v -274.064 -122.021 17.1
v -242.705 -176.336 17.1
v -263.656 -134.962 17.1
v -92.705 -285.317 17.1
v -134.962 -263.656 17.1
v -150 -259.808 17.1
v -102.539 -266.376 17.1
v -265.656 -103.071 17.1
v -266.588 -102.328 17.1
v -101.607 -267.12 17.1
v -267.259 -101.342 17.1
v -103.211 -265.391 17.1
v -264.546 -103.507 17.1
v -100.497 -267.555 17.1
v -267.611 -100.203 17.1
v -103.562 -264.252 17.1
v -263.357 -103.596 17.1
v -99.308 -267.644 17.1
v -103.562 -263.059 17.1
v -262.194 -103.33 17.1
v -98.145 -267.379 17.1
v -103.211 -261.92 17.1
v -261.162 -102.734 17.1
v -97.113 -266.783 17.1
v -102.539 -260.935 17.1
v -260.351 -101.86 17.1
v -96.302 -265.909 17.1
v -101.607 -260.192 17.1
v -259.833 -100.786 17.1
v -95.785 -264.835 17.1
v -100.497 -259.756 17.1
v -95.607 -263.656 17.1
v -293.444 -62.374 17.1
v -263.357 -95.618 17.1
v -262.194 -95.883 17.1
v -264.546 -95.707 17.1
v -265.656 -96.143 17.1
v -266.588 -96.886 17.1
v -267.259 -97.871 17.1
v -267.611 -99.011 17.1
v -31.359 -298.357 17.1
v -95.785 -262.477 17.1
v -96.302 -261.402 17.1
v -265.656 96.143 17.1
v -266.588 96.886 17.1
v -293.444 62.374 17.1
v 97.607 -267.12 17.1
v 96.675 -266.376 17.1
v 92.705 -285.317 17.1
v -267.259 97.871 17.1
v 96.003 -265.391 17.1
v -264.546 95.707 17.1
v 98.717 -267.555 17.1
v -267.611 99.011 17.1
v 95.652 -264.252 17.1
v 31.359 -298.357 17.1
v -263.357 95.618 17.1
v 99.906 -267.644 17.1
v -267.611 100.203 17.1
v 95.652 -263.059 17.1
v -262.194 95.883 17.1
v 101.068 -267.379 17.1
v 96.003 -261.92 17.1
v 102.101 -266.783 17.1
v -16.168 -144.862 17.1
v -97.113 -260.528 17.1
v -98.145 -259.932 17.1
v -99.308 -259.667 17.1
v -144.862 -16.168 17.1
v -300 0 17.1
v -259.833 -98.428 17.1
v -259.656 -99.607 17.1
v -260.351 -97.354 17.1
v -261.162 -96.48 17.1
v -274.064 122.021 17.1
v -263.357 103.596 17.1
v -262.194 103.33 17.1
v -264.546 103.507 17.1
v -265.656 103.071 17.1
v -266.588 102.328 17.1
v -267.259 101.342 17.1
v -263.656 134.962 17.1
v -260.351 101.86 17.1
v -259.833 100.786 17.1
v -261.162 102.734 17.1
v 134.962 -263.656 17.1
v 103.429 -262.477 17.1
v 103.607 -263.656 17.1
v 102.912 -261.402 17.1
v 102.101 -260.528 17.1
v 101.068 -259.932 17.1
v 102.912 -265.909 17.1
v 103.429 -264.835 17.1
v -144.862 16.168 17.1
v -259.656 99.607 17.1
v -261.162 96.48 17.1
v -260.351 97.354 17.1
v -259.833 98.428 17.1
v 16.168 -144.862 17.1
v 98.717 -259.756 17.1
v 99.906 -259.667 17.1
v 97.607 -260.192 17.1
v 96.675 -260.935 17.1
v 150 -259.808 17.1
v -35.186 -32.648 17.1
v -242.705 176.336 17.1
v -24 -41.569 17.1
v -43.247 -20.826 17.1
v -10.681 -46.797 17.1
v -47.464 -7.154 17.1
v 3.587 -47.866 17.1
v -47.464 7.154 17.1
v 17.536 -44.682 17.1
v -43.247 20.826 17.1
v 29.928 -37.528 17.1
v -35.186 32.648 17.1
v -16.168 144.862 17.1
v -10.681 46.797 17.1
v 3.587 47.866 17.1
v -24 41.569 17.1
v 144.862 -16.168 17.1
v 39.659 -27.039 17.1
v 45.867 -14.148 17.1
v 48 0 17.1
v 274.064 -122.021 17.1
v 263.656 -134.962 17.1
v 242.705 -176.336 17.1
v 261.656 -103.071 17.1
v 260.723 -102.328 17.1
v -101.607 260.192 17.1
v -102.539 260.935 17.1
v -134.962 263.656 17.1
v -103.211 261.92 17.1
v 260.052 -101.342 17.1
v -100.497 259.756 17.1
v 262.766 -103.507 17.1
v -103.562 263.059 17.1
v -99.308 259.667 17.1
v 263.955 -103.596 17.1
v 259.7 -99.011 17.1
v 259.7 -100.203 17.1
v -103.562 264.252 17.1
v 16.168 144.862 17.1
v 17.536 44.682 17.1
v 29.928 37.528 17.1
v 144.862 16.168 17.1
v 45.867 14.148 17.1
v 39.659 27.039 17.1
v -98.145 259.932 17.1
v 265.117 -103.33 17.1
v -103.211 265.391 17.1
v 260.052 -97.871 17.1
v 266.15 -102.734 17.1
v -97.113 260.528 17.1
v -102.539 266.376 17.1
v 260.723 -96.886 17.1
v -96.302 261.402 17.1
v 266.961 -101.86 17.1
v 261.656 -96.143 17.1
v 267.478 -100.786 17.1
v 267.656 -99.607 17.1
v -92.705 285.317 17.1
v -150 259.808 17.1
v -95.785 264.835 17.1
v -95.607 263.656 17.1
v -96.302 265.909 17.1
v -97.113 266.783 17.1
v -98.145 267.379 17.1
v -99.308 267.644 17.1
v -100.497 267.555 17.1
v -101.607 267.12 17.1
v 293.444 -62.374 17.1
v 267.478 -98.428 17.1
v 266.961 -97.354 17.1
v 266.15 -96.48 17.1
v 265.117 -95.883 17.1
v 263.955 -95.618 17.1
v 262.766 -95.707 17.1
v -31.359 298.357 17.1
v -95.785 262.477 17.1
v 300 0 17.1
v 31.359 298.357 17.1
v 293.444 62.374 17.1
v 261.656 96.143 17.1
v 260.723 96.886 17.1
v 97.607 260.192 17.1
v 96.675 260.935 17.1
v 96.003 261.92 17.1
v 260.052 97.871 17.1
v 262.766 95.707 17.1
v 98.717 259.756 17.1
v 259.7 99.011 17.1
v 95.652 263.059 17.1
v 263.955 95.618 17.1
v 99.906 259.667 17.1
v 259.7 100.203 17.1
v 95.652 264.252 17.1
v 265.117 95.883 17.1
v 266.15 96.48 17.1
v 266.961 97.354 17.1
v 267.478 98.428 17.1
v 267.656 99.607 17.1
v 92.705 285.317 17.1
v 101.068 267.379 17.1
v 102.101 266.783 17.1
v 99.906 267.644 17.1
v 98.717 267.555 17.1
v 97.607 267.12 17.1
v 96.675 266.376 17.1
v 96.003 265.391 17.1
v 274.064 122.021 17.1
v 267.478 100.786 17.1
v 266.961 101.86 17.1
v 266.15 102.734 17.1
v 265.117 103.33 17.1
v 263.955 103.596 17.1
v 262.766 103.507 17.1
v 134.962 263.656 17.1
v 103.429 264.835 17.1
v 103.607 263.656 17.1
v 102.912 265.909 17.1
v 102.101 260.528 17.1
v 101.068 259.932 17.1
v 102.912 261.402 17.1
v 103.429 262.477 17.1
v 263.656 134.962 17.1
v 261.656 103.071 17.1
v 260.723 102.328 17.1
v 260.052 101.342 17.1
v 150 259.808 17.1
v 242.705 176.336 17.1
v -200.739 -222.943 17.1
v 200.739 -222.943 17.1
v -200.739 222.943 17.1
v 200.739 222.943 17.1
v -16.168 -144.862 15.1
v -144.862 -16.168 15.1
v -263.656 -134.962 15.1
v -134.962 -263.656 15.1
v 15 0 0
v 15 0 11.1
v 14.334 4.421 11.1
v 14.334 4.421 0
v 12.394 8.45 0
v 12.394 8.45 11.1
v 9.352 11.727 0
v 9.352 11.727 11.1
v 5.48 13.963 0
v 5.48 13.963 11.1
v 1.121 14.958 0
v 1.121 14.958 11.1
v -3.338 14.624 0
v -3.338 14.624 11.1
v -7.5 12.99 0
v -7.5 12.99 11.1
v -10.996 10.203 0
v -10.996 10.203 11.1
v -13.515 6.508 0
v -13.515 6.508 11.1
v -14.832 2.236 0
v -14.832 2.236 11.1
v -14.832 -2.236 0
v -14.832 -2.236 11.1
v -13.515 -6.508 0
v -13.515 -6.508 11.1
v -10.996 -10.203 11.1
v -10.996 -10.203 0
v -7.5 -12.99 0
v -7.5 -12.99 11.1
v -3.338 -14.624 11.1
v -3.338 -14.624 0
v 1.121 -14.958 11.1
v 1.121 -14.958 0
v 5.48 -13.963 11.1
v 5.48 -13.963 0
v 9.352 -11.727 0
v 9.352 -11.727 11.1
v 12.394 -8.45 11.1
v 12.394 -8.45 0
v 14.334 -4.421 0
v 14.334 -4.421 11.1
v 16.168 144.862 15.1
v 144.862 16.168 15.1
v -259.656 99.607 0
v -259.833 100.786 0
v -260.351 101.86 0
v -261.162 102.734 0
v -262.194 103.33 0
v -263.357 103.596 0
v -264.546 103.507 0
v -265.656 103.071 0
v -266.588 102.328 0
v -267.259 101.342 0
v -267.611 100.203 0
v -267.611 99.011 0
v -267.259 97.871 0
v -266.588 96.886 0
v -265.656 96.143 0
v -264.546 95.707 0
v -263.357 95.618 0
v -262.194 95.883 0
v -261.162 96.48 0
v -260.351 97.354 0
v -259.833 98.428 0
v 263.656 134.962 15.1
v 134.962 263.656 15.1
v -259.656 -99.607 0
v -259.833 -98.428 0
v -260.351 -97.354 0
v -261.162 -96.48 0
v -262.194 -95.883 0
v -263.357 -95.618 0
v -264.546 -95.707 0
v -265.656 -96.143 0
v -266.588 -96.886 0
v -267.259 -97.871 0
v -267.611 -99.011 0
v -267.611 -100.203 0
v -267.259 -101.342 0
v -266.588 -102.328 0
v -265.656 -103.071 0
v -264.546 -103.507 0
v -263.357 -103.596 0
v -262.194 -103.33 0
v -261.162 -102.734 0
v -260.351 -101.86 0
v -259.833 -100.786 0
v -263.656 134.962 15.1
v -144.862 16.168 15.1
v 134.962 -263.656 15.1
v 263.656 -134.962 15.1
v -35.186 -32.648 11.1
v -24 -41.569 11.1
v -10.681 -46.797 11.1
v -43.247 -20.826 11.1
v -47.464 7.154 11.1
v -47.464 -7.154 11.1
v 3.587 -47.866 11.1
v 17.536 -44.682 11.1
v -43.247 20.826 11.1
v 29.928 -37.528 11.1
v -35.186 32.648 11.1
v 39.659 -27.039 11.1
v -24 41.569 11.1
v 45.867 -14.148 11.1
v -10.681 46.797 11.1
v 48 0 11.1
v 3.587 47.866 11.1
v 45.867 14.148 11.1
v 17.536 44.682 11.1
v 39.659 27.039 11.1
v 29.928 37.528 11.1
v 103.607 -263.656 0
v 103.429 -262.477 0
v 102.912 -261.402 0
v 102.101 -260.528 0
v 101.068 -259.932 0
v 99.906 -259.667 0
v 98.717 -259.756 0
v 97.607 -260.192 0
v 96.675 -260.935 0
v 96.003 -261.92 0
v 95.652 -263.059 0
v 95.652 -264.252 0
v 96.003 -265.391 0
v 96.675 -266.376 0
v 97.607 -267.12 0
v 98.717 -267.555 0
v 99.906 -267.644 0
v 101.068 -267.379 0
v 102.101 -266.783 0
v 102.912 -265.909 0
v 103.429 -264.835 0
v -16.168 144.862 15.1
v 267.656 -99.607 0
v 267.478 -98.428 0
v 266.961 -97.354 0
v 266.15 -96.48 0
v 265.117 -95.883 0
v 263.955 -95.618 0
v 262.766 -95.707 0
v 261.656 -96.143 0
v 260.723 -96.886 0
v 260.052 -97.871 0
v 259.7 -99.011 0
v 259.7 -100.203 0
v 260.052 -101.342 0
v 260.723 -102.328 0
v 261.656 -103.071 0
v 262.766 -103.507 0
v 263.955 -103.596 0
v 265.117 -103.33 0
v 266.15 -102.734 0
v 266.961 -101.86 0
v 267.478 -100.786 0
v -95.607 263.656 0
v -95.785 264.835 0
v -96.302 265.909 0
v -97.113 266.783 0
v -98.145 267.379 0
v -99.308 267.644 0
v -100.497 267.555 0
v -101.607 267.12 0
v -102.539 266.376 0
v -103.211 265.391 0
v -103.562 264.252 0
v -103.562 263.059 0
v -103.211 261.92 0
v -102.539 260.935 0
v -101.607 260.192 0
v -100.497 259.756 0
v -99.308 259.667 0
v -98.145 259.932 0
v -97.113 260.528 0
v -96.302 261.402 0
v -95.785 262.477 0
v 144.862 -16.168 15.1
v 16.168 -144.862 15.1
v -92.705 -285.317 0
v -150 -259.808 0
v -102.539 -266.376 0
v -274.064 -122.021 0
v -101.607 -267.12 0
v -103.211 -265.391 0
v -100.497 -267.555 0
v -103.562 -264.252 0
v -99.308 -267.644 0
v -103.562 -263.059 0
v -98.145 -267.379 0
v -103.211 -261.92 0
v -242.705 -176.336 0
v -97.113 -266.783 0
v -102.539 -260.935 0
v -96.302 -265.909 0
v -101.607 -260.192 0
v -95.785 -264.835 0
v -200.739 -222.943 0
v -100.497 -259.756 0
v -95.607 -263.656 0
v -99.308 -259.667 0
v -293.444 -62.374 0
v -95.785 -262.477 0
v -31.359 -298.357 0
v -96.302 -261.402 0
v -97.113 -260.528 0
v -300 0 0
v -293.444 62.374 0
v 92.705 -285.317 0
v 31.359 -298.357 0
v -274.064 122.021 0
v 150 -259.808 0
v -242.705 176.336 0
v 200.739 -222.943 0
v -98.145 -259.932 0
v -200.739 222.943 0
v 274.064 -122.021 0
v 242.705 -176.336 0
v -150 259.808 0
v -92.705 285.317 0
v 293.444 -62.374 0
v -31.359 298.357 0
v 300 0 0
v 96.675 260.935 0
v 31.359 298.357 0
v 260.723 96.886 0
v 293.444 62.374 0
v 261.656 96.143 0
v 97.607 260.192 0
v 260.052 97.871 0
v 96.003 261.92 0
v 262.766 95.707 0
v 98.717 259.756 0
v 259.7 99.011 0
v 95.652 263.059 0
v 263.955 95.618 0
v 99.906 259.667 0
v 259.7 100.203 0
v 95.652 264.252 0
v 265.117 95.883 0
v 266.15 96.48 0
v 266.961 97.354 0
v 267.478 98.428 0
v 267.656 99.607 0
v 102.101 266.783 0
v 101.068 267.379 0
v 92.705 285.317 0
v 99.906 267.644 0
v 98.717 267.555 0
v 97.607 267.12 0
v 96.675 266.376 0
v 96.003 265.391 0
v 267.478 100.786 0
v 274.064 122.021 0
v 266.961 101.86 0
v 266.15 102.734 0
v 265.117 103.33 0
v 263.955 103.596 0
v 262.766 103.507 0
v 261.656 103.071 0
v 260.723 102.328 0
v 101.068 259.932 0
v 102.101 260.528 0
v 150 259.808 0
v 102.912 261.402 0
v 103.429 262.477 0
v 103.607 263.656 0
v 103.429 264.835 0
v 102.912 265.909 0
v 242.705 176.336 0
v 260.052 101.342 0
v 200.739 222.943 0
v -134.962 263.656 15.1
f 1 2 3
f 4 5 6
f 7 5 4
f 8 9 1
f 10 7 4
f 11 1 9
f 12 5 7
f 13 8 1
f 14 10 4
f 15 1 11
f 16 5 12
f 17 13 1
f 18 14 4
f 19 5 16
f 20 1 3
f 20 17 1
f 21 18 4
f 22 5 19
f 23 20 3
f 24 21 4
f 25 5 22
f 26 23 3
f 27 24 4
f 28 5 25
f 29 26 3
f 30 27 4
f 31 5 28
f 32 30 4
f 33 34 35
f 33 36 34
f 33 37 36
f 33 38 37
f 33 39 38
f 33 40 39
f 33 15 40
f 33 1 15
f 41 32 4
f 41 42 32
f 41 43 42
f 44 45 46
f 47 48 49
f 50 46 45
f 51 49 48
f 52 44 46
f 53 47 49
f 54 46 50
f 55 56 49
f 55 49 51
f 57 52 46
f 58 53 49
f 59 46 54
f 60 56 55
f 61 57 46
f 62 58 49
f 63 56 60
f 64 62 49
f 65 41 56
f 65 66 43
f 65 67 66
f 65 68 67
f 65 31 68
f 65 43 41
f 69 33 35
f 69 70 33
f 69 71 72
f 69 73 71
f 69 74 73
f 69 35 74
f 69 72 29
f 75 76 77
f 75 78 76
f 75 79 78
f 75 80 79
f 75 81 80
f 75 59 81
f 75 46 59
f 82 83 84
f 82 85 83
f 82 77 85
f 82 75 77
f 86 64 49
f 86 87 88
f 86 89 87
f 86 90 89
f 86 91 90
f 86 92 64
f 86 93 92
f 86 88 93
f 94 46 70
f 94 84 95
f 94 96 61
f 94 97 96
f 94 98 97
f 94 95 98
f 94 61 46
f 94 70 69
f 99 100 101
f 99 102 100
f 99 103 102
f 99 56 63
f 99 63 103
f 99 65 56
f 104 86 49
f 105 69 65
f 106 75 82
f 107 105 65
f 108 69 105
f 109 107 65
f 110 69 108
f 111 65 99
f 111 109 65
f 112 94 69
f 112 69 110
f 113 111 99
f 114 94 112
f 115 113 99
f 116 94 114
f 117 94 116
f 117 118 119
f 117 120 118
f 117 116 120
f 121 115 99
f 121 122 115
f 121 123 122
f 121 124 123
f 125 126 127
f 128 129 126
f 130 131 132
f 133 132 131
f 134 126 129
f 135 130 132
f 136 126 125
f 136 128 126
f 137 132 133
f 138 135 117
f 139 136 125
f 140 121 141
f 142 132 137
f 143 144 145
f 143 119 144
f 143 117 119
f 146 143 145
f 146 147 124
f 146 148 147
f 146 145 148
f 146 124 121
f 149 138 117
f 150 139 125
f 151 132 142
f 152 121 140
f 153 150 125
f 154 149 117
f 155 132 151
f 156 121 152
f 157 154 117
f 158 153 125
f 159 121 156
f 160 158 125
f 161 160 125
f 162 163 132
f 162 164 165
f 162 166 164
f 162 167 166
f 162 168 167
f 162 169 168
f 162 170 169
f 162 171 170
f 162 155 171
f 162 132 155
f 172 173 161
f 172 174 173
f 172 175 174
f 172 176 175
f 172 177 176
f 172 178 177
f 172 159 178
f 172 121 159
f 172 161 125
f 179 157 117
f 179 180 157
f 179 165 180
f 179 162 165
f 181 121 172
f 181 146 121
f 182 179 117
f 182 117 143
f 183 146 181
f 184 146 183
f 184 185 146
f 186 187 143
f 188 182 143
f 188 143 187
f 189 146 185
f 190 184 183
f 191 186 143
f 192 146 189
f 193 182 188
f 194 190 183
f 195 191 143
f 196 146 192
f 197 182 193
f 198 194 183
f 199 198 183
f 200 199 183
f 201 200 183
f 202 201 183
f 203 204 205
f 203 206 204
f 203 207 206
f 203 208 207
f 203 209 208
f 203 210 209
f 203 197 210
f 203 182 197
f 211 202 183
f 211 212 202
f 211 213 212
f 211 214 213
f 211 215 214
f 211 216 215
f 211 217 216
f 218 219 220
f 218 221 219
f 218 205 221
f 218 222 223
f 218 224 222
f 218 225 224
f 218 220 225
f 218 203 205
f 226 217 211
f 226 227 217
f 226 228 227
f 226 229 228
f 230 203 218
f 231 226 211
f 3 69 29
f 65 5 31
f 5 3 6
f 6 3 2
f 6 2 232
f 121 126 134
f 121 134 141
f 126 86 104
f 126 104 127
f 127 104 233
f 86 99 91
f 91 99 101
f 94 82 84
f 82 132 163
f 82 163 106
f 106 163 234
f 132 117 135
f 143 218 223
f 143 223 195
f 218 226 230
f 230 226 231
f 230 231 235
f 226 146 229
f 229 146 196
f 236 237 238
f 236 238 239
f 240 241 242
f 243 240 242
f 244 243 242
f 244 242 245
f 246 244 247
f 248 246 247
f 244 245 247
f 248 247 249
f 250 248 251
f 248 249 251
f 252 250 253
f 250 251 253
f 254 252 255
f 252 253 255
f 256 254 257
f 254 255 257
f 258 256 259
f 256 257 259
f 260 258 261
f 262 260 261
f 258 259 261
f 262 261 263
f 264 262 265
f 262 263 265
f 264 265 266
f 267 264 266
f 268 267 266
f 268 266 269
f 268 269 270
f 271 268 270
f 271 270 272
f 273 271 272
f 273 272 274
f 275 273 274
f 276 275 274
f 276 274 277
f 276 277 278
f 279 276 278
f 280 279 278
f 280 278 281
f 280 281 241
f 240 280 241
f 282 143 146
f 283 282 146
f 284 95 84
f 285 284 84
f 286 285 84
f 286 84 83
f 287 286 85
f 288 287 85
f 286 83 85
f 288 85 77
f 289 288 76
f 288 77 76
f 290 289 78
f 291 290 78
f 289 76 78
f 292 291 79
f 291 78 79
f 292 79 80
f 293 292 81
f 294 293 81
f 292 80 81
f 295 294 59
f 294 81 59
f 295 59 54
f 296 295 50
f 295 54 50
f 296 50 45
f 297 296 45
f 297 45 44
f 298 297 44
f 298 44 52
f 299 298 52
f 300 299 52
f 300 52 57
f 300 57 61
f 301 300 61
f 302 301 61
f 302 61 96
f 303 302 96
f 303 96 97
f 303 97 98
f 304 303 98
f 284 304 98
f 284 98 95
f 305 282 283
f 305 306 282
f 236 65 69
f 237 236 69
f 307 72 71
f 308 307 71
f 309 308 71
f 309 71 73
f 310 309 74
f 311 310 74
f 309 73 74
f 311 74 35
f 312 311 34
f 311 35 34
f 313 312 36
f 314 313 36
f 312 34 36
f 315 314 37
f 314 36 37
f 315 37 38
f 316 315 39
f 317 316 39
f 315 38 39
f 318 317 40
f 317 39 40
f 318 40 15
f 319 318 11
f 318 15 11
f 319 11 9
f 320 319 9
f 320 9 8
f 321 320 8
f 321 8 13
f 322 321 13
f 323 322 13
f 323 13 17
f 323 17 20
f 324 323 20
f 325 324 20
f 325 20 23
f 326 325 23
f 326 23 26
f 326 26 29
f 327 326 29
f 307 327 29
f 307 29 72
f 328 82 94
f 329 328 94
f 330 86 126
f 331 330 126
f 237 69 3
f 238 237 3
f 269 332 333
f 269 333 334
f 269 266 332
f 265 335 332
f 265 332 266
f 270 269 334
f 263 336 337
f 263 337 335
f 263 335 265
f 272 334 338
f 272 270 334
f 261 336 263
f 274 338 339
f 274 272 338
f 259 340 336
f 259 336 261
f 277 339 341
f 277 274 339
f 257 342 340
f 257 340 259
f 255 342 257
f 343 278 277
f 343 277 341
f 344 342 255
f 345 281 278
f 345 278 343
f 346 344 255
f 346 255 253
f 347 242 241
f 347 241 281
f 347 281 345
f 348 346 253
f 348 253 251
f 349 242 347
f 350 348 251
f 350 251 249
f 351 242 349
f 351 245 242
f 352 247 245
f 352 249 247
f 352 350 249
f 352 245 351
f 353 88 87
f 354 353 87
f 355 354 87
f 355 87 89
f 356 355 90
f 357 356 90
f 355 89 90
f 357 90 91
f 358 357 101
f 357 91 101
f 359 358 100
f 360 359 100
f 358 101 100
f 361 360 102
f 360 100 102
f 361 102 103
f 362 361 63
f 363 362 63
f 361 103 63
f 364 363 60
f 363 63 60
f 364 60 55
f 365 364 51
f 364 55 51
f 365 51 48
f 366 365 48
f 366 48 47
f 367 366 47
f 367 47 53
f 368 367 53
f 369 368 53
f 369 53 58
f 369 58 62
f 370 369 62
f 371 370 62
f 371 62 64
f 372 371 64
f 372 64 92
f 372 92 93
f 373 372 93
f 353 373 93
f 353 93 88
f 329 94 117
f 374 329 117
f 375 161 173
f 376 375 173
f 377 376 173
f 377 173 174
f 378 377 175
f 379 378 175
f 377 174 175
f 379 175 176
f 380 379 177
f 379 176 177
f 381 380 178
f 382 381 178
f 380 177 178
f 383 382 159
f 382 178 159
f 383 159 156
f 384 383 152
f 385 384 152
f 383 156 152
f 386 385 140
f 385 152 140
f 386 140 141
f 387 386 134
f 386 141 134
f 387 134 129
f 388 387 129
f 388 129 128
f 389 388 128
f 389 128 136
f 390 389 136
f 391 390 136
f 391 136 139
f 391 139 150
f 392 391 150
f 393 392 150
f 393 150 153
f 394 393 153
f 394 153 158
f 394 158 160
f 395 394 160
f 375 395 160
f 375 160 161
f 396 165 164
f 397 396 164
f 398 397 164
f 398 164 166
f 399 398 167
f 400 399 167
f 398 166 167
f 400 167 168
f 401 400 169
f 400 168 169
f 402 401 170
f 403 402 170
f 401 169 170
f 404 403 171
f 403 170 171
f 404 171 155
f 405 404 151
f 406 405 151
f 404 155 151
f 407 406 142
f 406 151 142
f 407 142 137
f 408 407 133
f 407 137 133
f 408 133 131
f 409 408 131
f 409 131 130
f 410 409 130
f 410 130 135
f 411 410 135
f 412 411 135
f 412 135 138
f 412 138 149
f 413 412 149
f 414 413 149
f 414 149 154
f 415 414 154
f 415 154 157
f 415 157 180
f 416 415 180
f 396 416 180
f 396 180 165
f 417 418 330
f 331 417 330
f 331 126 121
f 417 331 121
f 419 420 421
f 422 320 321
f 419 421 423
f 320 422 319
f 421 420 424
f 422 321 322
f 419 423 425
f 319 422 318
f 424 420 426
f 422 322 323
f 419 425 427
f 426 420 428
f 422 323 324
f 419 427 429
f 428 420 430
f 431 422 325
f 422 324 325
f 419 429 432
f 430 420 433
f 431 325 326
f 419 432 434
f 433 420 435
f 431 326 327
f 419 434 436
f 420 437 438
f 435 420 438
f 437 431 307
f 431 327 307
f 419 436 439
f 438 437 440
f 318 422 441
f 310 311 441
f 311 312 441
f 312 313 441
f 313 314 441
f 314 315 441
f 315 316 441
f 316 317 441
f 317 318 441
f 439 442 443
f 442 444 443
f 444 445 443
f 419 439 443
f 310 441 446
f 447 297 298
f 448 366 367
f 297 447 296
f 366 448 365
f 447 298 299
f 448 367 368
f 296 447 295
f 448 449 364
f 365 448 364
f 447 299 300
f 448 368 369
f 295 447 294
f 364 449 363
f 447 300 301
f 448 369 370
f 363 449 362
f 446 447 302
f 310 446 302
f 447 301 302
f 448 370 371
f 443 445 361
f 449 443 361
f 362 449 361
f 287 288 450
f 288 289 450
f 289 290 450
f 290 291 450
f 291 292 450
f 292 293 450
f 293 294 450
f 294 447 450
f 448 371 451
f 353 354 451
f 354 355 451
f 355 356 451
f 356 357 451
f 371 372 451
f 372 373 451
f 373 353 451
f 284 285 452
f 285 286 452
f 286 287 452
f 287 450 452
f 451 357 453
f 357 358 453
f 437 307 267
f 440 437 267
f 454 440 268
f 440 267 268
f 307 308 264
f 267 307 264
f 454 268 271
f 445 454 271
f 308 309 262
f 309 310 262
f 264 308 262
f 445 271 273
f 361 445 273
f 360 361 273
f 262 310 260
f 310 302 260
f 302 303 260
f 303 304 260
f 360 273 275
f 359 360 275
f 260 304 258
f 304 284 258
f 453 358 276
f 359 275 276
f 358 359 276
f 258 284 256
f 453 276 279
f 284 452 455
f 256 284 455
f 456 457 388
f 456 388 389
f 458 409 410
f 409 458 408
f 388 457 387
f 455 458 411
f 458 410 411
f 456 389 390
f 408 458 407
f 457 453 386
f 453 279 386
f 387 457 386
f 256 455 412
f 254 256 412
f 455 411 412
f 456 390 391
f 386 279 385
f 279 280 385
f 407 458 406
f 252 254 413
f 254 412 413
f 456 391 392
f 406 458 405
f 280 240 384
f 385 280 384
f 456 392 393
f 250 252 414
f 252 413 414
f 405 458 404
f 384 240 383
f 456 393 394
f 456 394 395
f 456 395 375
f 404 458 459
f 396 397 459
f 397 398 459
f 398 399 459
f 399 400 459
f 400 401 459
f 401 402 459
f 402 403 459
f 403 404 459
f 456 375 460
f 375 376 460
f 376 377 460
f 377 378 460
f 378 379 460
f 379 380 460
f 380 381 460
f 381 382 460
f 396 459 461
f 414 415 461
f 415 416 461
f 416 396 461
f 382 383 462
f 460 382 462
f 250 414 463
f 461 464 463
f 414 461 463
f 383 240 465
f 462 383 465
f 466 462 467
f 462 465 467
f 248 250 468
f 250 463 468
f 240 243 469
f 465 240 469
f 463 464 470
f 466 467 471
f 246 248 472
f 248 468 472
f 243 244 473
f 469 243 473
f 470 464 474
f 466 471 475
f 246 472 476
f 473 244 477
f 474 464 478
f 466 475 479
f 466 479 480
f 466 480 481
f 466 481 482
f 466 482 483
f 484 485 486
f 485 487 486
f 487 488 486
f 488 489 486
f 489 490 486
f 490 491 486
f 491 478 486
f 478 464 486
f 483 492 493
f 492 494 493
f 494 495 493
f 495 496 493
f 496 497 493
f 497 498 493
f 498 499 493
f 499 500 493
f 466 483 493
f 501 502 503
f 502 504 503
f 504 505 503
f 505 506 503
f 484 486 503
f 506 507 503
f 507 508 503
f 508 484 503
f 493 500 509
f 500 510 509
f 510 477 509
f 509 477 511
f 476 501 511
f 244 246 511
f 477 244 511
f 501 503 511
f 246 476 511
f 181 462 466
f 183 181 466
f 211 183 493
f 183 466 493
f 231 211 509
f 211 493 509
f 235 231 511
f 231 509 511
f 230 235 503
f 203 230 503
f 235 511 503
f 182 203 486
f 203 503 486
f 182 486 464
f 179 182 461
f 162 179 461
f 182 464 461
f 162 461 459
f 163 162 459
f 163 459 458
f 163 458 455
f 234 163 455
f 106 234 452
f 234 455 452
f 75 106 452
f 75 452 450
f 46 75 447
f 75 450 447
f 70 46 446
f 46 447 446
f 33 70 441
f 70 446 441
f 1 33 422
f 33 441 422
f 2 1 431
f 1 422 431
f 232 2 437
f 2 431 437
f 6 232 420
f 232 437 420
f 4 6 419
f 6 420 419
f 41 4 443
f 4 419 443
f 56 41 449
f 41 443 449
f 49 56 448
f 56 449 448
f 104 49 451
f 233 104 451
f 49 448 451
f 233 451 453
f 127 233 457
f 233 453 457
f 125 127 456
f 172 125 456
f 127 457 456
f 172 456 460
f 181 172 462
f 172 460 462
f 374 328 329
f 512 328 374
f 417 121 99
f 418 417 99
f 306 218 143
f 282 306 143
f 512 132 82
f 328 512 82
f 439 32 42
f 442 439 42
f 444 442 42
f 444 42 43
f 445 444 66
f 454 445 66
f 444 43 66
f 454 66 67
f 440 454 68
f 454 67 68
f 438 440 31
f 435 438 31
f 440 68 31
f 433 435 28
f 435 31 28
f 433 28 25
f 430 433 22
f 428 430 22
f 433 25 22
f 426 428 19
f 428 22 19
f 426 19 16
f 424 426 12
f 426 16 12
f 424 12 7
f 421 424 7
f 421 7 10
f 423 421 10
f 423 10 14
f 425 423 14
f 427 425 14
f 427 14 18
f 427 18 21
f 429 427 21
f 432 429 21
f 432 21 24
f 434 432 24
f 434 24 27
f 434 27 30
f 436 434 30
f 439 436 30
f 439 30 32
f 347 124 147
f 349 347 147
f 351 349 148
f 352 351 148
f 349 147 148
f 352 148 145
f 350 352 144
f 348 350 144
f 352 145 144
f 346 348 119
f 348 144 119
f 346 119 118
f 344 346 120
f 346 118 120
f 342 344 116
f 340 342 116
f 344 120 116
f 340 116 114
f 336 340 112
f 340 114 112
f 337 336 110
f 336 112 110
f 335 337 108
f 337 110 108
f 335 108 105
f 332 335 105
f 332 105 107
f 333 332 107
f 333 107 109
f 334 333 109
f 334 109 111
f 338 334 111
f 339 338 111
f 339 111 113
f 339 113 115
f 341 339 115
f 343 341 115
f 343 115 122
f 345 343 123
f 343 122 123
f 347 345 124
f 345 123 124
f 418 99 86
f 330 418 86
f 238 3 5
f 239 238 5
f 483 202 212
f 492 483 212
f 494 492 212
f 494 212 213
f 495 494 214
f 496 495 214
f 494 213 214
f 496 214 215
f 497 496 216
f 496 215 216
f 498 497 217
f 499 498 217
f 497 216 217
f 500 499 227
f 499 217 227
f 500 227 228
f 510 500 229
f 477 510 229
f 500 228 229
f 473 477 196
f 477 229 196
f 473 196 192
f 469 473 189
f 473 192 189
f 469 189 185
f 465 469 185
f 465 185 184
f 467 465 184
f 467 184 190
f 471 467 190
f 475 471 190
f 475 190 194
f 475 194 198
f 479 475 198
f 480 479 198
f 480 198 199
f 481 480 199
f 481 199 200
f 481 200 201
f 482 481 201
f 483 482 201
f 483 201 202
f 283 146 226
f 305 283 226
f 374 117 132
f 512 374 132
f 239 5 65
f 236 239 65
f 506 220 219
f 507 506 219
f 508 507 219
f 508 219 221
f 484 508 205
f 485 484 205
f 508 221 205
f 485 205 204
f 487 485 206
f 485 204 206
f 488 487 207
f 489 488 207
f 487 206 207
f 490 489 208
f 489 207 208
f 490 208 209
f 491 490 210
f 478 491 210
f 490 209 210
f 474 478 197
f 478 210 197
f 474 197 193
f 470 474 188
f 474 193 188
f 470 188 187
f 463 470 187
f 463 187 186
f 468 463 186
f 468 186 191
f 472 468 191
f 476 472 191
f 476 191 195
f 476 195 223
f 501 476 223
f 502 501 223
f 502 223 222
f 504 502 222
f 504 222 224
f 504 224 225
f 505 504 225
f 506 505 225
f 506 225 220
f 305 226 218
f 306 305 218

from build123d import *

# Parameters (mm, degrees)
F0_R     = 300
F1_DEPTH = 17.1
F3_DEPTH = 2
F4_R     = 4
F5_DEPTH = 25
F6_R     = 48
F7_DEPTH = 6
F8_R     = 15
F9_DEPTH = 11.101


# Not quite as in the source:
# - a feature names something its author has since deleted; it is built from what else it names


with BuildPart() as f1:
    # F0 (on Top) → F1 (new body)
    with BuildSketch(Plane.XY):
        Circle(F0_R)
    extrude(amount=F1_DEPTH)

    # F2 (on face) → F3 (cut)
    with BuildSketch(Plane.XY.offset(17.1)):
        Polygon((-144.8616802798, -16.1682461039), (-263.6556195192, -134.9621853432), (-134.9621853432, -263.6556195192), (-16.1682461039, -144.8616802798), align=None)
        Polygon((144.8616802798, -16.1682461039), (16.1682461039, -144.8616802798), (134.9621853432, -263.6556195192), (263.6556195192, -134.9621853432), align=None)
        Polygon((16.1682461039, 144.8616802798), (144.8616802798, 16.1682461039), (263.6556195192, 134.9621853432), (134.9621853432, 263.6556195192), align=None)
        Polygon((-144.8616802798, 16.1682461039), (-16.1682461039, 144.8616802798), (-134.9621853432, 263.6556195192), (-263.6556195192, 134.9621853432), align=None)
    extrude(amount=-F3_DEPTH, mode=Mode.SUBTRACT)

    # F4 (on face) → F5 (cut)
    with BuildSketch(Plane.XY.offset(17.1)):
        with Locations((-263.6556195192, -99.6068462839)):
            Circle(F4_R)
        with Locations((-99.6068462839, -263.6556195192)):
            Circle(F4_R)
        with Locations((99.6068462839, -263.6556195192)):
            Circle(F4_R)
        with Locations((263.6556195192, -99.6068462839)):
            Circle(F4_R)
        with Locations((263.6556195192, 99.6068462839)):
            Circle(F4_R)
        with Locations((99.6068462839, 263.6556195192)):
            Circle(F4_R)
        with Locations((-99.6068462839, 263.6556195192)):
            Circle(F4_R)
        with Locations((-263.6556195192, 99.6068462839)):
            Circle(F4_R)
    extrude(amount=-F5_DEPTH, mode=Mode.SUBTRACT)

    # F6 (on face) → F7 (cut)
    with BuildSketch(Plane.XY.offset(17.1)):
        Circle(F6_R)
    extrude(amount=-F7_DEPTH, mode=Mode.SUBTRACT)

    # F8 (on face) → F9 (cut, through all)
    with BuildSketch(Plane.XY.offset(11.1)):
        Circle(F8_R)
    extrude(amount=-F9_DEPTH, mode=Mode.SUBTRACT)


solid = f1.part
